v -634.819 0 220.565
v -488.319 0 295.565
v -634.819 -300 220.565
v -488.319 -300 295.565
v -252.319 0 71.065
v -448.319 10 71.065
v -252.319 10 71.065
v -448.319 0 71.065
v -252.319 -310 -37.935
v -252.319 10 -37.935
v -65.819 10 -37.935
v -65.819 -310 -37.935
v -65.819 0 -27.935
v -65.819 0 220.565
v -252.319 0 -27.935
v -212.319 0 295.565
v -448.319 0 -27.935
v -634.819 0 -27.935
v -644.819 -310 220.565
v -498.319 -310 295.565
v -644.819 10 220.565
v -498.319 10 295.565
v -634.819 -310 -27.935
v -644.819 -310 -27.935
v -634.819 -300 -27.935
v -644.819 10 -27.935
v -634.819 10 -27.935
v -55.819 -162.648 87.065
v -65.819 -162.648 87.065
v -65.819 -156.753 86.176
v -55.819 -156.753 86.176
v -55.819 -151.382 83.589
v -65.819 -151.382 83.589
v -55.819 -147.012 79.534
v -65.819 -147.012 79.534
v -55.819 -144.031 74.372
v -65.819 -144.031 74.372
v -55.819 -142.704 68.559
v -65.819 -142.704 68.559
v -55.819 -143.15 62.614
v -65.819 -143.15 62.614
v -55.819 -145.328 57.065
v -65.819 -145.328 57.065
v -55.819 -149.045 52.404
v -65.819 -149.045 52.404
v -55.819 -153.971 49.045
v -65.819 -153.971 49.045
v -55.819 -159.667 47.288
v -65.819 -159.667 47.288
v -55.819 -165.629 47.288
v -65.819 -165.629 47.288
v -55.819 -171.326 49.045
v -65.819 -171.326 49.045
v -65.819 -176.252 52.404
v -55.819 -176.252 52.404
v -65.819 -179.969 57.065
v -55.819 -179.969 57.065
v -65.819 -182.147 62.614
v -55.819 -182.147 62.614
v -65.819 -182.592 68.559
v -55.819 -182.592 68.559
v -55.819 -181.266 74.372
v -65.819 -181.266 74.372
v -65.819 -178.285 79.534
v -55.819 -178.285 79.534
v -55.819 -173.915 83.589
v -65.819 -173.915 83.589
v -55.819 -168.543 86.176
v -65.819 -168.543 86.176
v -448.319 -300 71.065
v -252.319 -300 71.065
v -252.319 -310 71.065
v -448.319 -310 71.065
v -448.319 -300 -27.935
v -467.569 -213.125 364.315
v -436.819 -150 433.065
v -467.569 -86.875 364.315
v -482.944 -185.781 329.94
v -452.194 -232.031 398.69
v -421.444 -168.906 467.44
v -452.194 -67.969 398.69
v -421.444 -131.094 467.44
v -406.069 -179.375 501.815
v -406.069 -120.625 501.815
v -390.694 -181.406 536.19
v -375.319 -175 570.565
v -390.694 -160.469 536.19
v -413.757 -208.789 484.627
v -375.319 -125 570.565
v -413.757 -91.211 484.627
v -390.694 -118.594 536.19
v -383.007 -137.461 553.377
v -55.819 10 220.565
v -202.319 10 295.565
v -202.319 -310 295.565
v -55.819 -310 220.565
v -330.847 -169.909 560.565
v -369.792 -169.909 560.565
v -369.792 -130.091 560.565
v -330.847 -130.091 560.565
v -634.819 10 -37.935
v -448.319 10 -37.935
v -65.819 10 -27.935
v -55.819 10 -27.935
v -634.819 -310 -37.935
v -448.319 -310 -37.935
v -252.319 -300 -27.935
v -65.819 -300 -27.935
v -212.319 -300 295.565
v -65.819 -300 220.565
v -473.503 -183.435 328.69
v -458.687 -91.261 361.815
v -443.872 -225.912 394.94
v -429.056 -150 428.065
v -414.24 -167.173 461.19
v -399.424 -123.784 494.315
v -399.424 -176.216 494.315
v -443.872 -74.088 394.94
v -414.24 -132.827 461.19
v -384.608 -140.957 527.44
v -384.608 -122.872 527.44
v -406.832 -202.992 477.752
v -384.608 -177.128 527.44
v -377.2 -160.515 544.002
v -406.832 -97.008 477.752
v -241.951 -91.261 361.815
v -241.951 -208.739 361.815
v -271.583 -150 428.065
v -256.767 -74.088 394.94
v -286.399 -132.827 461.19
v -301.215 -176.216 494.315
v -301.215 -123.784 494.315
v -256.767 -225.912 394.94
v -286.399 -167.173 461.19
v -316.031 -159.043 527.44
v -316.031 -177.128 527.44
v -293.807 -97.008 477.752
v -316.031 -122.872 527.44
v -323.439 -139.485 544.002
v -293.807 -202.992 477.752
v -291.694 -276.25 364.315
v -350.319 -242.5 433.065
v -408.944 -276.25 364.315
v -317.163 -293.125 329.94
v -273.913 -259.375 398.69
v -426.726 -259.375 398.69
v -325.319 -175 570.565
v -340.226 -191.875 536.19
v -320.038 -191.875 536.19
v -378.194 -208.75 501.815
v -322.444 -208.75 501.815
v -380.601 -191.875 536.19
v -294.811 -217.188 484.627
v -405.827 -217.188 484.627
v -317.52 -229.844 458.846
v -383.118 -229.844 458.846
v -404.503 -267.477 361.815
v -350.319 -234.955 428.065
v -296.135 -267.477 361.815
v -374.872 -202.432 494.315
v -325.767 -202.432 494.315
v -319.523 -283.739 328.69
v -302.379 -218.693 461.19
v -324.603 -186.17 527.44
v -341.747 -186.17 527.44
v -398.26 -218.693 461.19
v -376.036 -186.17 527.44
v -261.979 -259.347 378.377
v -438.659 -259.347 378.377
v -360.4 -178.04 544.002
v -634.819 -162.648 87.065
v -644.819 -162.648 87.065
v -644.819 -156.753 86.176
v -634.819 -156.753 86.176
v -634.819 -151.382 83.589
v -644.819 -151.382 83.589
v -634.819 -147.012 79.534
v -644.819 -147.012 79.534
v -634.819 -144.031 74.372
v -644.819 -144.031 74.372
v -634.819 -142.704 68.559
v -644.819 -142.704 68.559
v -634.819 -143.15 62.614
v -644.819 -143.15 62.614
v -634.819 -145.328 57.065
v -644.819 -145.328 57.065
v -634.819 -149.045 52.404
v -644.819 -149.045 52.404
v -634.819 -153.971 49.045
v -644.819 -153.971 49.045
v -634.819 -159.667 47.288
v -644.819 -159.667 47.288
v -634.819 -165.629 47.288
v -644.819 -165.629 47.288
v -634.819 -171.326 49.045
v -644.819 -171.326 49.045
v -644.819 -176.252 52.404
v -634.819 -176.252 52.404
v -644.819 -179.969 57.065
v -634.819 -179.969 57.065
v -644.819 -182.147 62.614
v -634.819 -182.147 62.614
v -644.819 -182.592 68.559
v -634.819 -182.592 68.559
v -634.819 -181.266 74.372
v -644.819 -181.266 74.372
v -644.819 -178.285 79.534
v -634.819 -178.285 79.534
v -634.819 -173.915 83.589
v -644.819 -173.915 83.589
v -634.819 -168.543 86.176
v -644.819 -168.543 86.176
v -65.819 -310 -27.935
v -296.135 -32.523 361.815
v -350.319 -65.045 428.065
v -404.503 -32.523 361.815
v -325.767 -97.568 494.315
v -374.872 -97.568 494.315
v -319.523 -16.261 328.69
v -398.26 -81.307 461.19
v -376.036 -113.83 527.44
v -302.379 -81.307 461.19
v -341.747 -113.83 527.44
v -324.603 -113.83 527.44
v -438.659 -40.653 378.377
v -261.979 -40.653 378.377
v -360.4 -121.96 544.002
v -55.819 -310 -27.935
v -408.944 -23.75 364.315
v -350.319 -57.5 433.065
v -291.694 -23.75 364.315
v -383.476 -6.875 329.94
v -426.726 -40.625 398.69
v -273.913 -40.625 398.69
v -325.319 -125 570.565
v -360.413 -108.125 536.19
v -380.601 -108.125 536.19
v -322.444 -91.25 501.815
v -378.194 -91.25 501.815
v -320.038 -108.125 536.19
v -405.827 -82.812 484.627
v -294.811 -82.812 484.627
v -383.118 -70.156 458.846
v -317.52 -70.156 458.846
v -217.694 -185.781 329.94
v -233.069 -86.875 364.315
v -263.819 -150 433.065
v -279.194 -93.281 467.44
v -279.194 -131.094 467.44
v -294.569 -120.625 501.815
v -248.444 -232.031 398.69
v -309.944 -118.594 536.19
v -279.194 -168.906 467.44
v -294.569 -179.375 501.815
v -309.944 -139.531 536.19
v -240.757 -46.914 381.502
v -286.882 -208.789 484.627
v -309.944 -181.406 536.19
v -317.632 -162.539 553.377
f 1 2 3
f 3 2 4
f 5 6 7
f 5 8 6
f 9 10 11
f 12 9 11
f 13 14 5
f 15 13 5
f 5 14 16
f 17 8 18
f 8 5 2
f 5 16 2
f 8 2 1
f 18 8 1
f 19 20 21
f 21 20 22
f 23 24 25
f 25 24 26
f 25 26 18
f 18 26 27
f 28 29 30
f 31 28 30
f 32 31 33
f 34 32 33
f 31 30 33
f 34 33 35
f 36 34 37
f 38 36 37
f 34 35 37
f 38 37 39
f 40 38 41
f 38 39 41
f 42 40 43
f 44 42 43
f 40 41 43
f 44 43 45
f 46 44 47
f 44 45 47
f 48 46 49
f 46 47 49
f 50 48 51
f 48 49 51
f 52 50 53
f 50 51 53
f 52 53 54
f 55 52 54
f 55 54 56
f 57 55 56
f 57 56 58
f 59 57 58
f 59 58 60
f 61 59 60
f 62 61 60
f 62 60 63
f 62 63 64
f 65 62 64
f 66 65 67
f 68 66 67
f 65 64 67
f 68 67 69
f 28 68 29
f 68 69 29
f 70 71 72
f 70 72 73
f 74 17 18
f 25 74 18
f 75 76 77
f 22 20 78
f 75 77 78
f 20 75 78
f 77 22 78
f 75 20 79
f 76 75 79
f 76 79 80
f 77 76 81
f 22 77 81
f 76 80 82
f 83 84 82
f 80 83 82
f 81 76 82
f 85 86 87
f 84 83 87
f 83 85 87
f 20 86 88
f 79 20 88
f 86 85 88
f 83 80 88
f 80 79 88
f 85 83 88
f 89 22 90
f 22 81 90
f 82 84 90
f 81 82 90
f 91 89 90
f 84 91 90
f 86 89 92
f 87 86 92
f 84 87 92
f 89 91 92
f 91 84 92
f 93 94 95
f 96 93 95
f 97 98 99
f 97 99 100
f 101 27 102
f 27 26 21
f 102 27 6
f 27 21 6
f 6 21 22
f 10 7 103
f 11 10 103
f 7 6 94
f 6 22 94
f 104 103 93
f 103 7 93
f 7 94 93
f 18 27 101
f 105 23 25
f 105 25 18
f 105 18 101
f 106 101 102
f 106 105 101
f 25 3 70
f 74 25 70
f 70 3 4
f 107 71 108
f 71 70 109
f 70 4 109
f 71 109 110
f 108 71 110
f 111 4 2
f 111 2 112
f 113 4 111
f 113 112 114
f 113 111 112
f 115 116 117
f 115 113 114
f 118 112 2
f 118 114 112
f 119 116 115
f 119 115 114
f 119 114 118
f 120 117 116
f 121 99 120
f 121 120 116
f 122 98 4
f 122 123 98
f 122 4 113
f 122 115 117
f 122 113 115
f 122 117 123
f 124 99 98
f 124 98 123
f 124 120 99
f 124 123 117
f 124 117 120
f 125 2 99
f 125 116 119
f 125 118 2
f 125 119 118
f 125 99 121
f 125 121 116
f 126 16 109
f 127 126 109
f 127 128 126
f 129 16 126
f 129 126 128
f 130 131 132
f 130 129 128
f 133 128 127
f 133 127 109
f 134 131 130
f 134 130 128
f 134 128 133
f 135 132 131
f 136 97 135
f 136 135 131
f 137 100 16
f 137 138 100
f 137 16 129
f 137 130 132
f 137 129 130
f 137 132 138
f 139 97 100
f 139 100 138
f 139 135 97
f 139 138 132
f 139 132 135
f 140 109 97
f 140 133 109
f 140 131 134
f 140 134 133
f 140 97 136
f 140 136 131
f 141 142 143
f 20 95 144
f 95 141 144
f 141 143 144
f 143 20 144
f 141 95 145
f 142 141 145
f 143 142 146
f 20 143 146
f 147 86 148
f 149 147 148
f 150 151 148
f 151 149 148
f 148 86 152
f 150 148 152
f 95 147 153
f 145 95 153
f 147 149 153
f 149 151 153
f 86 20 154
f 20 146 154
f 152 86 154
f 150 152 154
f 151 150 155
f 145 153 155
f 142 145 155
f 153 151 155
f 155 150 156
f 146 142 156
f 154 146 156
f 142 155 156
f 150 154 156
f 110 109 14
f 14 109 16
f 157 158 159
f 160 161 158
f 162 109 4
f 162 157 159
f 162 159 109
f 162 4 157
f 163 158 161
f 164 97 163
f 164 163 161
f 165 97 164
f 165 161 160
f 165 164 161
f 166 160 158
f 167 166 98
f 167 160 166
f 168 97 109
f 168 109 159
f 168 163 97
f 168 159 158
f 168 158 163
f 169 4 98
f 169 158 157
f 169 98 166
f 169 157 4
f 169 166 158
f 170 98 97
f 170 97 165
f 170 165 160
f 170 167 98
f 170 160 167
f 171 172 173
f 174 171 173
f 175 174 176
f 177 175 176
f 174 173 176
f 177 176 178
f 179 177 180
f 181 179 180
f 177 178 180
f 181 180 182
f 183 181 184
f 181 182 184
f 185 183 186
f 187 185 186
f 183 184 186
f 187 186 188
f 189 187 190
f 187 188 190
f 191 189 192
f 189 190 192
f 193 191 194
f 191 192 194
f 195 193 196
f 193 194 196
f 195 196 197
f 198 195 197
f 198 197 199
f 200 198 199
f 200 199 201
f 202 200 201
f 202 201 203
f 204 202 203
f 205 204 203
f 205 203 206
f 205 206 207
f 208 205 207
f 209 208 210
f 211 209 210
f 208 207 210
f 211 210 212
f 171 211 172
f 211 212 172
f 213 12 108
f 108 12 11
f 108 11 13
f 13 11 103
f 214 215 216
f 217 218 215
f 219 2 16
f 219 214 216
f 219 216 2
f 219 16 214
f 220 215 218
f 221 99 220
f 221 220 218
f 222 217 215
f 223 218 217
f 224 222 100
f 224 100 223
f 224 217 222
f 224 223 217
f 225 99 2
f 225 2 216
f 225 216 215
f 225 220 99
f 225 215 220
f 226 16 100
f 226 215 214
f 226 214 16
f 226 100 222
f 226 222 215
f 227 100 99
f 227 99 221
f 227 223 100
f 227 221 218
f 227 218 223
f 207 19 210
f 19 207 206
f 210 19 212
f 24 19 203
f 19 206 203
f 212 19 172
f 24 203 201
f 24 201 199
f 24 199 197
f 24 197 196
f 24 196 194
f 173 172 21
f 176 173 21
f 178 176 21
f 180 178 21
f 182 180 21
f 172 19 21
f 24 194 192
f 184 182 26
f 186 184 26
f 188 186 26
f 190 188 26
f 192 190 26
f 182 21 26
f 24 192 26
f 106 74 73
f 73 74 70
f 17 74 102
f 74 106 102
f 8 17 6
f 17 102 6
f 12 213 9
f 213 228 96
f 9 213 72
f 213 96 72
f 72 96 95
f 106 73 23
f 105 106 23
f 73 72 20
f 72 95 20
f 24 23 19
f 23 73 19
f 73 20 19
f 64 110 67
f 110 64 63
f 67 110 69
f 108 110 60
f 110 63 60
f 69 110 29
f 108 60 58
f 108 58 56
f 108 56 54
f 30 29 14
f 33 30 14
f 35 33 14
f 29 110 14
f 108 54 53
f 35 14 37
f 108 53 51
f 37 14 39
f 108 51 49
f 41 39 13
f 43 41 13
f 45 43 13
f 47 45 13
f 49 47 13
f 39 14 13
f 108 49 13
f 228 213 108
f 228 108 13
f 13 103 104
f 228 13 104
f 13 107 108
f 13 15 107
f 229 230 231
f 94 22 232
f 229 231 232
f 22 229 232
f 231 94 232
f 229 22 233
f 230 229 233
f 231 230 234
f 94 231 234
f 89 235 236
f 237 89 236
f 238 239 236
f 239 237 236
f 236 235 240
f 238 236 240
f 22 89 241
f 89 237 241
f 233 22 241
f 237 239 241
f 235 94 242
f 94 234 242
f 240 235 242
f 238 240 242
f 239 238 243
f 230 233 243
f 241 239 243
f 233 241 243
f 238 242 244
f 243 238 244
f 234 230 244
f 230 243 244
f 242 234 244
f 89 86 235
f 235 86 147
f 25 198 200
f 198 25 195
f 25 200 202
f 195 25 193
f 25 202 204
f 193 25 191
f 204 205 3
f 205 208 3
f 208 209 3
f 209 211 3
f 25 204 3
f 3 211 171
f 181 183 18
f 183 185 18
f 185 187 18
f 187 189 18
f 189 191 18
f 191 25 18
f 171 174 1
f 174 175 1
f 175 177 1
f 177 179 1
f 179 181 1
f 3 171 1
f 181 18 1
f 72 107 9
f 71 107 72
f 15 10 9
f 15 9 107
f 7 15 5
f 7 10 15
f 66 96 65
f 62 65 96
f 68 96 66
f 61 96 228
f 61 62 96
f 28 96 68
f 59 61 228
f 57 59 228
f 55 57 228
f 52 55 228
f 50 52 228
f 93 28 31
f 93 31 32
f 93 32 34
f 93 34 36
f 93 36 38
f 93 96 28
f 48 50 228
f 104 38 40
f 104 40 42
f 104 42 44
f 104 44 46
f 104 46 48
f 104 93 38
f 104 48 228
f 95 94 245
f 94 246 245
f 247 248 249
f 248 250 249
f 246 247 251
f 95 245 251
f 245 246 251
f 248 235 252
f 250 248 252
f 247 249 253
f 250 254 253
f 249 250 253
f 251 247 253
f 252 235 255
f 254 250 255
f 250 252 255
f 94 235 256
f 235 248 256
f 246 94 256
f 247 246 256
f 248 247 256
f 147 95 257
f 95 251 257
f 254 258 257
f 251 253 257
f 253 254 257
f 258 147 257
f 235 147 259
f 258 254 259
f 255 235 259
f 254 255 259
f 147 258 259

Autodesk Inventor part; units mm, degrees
sketch "Sketch1" plane through (0, 0, 0) normal (0, 1, 0) x (-1, 0, 0)
  line L0 (65.8193, -27.9353) -> (65.8193, 275.5647)
  line L1 (65.8193, 275.5647) -> (634.8193, 275.5647)
  line L2 (634.8193, 275.5647) -> (634.8193, -27.9353)
  line L3 (448.3193, 71.0647) -> (252.3193, 71.0647)
  line L4 (448.3193, 71.0647) -> (448.3193, -27.9353)
  line L5 (252.3193, 71.0647) -> (252.3193, -27.9353)
  line L6 (65.8193, -27.9353) -> (252.3193, -27.9353)
  line L7 (448.3193, -27.9353) -> (634.8193, -27.9353)
  point P0 (0, 0)
  dimension "d0" = 569
  dimension "d1" = 303.5
  dimension "d2" = 196
  dimension "d3" = 186.5
  dimension "d4" = 99
extrude "Extrusion1" add sketch "Sketch1" along normal blind 10
sketch "Sketch2" plane through (0, 0, 0) normal (0, -1, 0) x (1, 0, 0)
  line L0 (-65.8193, 275.5647) -> (-65.8193, -27.9353) projected
  line L1 (-65.8193, 275.5647) -> (-65.8193, -27.9353)
  line L2 (-65.8193, -27.9353) -> (-55.8193, -27.9353)
  line L3 (-55.8193, -27.9353) -> (-55.8193, 275.5647)
  line L4 (-55.8193, 275.5647) -> (-65.8193, 275.5647)
  line L5 (-634.8193, 275.5647) -> (-65.8193, 275.5647) projected
  line L6 (-634.8193, -27.9353) -> (-634.8193, 275.5647) projected
  line L7 (-634.8193, 275.5647) -> (-634.8193, -27.9353)
  line L8 (-634.8193, -27.9353) -> (-644.8193, -27.9353)
  line L9 (-644.8193, -27.9353) -> (-644.8193, 275.5647)
  line L10 (-644.8193, 275.5647) -> (-634.8193, 275.5647)
  point P0 (0, 0)
  dimension "d7" = 10
  dimension "d8" = 10
extrude "Extrusion2" add sketch "Sketch2" along normal blind 300
extrude "Extrusion3" add sketch "Sketch2" against normal blind 10
sketch "Sketch3" plane through (0, 0, 0) normal (0, -1, 0) x (1, 0, 0)
  line L0 (-252.3193, -27.9353) -> (-65.8193, -27.9353) projected
  line L1 (-252.3193, -27.9353) -> (-65.8193, -27.9353)
  line L2 (-65.8193, -27.9353) -> (-65.8193, -37.9353)
  line L3 (-65.8193, -37.9353) -> (-252.3193, -37.9353)
  line L4 (-252.3193, -37.9353) -> (-252.3193, -27.9353)
  line L5 (-448.3193, 71.0647) -> (-448.3193, -27.9353) projected
  line L6 (-448.3193, -37.9353) -> (-448.3193, -27.9353)
  line L7 (-634.8193, -27.9353) -> (-634.8193, 275.5647) projected
  line L8 (-448.3193, -27.9353) -> (-634.8193, -27.9353)
  line L9 (-634.8193, -27.9353) -> (-634.8193, -37.9353)
  line L10 (-634.8193, -37.9353) -> (-448.3193, -37.9353)
  point P0 (0, 0)
  point P1 (-644.8193, -27.9353)
  point P2 (-541.5693, -37.9353)
  point P3 (-159.0693, -37.9353)
  point P4 (-448.3193, -32.9353)
  dimension "d13" = 10
extrude "Extrusion4" add sketch "Sketch3" against normal blind 10
extrude "Extrusion5" add sketch "Sketch3" along normal blind 300
ref_plane "Work Plane1" through (0, -150, 0) normal (0, -1, 0) x (1, 0, 0)
mirror "Mirror1" about plane through (0, -150, 0) normal (0, -1, 0) of "Extrusion1", "Extrusion4", "Extrusion3"
sketch "Sketch4" plane through (-644.8193, 10, -27.9353) normal (-1, 0, 0) x (0, 0, 1)
  circle A0 centre (95, -172.6482) radius 20
  line L0 (0, 0) -> (0, -320) projected
  point P0 (27.9353, -10)
  dimension "d20" = 40
  dimension "d21" = 95
extrude "Extrusion6" cut sketch "Sketch4" against normal through all
sketch "Sketch5" plane through (0, 10, 0) normal (0, 1, 0) x (1, 0, 0)
  line L0 (-65.8193, -275.5647) -> (-634.8193, -275.5647) projected
  line L1 (-644.8193, 27.9353) -> (-644.8193, -275.5647) projected
  line L2 (-644.8193, -220.5647) -> (-519.8193, -220.5647)
  line L3 (-644.8193, -275.5647) -> (-55.8193, -275.5647) projected
  line L4 (-55.8193, -275.5647) -> (-55.8193, 27.9353) projected
  line L5 (-55.8193, -220.5647) -> (-55.8193, -275.5647)
  line L6 (-464.8193, -275.5647) -> (-55.8193, -275.5647)
  line L7 (-464.8193, -275.5647) -> (-644.8193, -275.5647)
  line L8 (-644.8193, -275.5647) -> (-644.8193, -220.5647)
  line L9 (-55.8193, -220.5647) -> (-519.8193, -220.5647)
  point P0 (0, 0)
  point P1 (-118.3193, -220.5647)
  point P2 (-582.3193, -220.5647)
  dimension "d27" = 125
extrude "Extrusion7" cut sketch "Sketch5" against normal through all
ref_plane "Work Plane3" through (-644.8193, 10, 570.5647) normal (0, 0, 1) x (1, 0, 0)
ref_plane "Work Plane4" through (-644.8193, 10, 295.5647) normal (0, 0, 1) x (1, 0, 0)
sketch "Sketch9" plane through (-644.8193, 10, 295.5647) normal (0, 0, 1) x (1, 0, 0)
  line L0 (146.5, -320) -> (146.5, 0)
  line L1 (146.5, 0) -> (442.5, 0)
  line L2 (442.5, 0) -> (442.5, -320)
  line L3 (442.5, -320) -> (146.5, -320)
  line L4 (10, -310) -> (579, -310) construction
  line L5 (392.5, -10) -> (392.5, -310) construction
  line L6 (579, -10) -> (10, -10) construction
  line L7 (0, 0) -> (589, 0) construction
  line L8 (156.5, -10) -> (156.5, -310) construction
  line L9 (156.5, -310) -> (432.5, -310) construction
  line L10 (432.5, -310) -> (432.5, -10) construction
  line L11 (432.5, -10) -> (156.5, -10) construction
  point P0 (644.8193, -10)
  point P1 (146.5, -160)
  point P2 (392.5, -160)
  point P3 (294.5, -10)
  point P4 (294.5, 0)
  point P5 (294.5, 0)
  point P6 (294.5, -320)
  dimension "d50" = 296
  dimension "d51" = 10
sketch "Sketch10" plane through (-644.8193, 10, 570.5647) normal (0, 0, 1) x (1, 0, 0)
  line L0 (269.5, -185) -> (319.5, -185)
  line L1 (319.5, -185) -> (319.5, -135)
  line L2 (319.5, -135) -> (269.5, -135)
  line L3 (269.5, -135) -> (269.5, -185)
  line L4 (196.5, -10) -> (196.5, -310) projected
  line L5 (579, -10) -> (10, -10) projected
  line L6 (279.5, -175) -> (279.5, -145) construction
  line L7 (279.5, -145) -> (309.5, -145) construction
  line L8 (309.5, -145) -> (309.5, -175) construction
  line L9 (309.5, -175) -> (279.5, -175) construction
  point P0 (644.8193, -10)
  point P1 (269.5, -160)
  point P2 (196.5, -160)
  point P3 (294.5, -135)
  point P4 (294.5, -10)
  dimension "d52" = 50
  dimension "d53" = 50
  dimension "d54" = 10
loft "Loft3" add profiles "Sketch9" section 1 edges at (-350.3193, -310, 220.5647) (-55.8193, -150, 220.5647) (-350.3193, 10, 220.5647) (-644.8193, -150, 220.5647)
sketch "Sketch11" plane through (-644.8193, 10, 295.5647) normal (0, 0, 1) x (1, 0, 0)
  line L0 (146.5, -320) -> (442.5, -320) construction
  line L1 (442.5, -320) -> (442.5, 0) construction
  line L2 (442.5, 0) -> (146.5, 0) construction
  line L3 (146.5, 0) -> (146.5, -320) construction
  line L4 (432.5, -10) -> (432.5, -310)
  line L5 (432.5, -310) -> (156.5, -310)
  line L6 (156.5, -310) -> (156.5, -10)
  line L7 (156.5, -10) -> (432.5, -10)
  point P0 (644.8193, -10)
  dimension "d59" = 10
loft "Loft4" cut profiles "Sketch11" section 1 edges at (-350.3193, -300, 220.5647) (-634.8193, -150, 220.5647) (-350.3193, 0, 220.5647) (-65.8193, -150, 220.5647)
loft "Loft5" add profiles "Sketch10" section 1 edges at (-350.3193, -310, 295.5647) (-202.3193, -150, 295.5647) (-350.3193, 10, 295.5647) (-498.3193, -150, 295.5647)
sketch "Sketch12" plane through (-644.8193, 10, 570.5647) normal (0, 0, 1) x (1, 0, 0)
  line L0 (309.5, -175) -> (309.5, -145)
  line L1 (309.5, -145) -> (279.5, -145)
  line L2 (279.5, -145) -> (279.5, -175)
  line L3 (279.5, -175) -> (309.5, -175)
  line L4 (319.5, -185) -> (269.5, -185) projected
  line L5 (319.5, -135) -> (319.5, -185) projected
  point P0 (644.8193, -10)
  point P1 (294.5, -175)
  point P2 (294.5, -185)
  point P3 (309.5, -160)
  point P4 (319.5, -160)
  dimension "d69" = 30
  dimension "d70" = 30
loft "Loft6" cut profiles "Sketch12" section 1 edges at (-212.3193, -150, 295.5647) (-350.3193, -300, 295.5647) (-488.3193, -150, 295.5647) (-350.3193, 0, 295.5647)
extrude "Extrusion9" add sketch "Sketch10" against normal blind 10 draft 10
properties part number "armorMk1"
